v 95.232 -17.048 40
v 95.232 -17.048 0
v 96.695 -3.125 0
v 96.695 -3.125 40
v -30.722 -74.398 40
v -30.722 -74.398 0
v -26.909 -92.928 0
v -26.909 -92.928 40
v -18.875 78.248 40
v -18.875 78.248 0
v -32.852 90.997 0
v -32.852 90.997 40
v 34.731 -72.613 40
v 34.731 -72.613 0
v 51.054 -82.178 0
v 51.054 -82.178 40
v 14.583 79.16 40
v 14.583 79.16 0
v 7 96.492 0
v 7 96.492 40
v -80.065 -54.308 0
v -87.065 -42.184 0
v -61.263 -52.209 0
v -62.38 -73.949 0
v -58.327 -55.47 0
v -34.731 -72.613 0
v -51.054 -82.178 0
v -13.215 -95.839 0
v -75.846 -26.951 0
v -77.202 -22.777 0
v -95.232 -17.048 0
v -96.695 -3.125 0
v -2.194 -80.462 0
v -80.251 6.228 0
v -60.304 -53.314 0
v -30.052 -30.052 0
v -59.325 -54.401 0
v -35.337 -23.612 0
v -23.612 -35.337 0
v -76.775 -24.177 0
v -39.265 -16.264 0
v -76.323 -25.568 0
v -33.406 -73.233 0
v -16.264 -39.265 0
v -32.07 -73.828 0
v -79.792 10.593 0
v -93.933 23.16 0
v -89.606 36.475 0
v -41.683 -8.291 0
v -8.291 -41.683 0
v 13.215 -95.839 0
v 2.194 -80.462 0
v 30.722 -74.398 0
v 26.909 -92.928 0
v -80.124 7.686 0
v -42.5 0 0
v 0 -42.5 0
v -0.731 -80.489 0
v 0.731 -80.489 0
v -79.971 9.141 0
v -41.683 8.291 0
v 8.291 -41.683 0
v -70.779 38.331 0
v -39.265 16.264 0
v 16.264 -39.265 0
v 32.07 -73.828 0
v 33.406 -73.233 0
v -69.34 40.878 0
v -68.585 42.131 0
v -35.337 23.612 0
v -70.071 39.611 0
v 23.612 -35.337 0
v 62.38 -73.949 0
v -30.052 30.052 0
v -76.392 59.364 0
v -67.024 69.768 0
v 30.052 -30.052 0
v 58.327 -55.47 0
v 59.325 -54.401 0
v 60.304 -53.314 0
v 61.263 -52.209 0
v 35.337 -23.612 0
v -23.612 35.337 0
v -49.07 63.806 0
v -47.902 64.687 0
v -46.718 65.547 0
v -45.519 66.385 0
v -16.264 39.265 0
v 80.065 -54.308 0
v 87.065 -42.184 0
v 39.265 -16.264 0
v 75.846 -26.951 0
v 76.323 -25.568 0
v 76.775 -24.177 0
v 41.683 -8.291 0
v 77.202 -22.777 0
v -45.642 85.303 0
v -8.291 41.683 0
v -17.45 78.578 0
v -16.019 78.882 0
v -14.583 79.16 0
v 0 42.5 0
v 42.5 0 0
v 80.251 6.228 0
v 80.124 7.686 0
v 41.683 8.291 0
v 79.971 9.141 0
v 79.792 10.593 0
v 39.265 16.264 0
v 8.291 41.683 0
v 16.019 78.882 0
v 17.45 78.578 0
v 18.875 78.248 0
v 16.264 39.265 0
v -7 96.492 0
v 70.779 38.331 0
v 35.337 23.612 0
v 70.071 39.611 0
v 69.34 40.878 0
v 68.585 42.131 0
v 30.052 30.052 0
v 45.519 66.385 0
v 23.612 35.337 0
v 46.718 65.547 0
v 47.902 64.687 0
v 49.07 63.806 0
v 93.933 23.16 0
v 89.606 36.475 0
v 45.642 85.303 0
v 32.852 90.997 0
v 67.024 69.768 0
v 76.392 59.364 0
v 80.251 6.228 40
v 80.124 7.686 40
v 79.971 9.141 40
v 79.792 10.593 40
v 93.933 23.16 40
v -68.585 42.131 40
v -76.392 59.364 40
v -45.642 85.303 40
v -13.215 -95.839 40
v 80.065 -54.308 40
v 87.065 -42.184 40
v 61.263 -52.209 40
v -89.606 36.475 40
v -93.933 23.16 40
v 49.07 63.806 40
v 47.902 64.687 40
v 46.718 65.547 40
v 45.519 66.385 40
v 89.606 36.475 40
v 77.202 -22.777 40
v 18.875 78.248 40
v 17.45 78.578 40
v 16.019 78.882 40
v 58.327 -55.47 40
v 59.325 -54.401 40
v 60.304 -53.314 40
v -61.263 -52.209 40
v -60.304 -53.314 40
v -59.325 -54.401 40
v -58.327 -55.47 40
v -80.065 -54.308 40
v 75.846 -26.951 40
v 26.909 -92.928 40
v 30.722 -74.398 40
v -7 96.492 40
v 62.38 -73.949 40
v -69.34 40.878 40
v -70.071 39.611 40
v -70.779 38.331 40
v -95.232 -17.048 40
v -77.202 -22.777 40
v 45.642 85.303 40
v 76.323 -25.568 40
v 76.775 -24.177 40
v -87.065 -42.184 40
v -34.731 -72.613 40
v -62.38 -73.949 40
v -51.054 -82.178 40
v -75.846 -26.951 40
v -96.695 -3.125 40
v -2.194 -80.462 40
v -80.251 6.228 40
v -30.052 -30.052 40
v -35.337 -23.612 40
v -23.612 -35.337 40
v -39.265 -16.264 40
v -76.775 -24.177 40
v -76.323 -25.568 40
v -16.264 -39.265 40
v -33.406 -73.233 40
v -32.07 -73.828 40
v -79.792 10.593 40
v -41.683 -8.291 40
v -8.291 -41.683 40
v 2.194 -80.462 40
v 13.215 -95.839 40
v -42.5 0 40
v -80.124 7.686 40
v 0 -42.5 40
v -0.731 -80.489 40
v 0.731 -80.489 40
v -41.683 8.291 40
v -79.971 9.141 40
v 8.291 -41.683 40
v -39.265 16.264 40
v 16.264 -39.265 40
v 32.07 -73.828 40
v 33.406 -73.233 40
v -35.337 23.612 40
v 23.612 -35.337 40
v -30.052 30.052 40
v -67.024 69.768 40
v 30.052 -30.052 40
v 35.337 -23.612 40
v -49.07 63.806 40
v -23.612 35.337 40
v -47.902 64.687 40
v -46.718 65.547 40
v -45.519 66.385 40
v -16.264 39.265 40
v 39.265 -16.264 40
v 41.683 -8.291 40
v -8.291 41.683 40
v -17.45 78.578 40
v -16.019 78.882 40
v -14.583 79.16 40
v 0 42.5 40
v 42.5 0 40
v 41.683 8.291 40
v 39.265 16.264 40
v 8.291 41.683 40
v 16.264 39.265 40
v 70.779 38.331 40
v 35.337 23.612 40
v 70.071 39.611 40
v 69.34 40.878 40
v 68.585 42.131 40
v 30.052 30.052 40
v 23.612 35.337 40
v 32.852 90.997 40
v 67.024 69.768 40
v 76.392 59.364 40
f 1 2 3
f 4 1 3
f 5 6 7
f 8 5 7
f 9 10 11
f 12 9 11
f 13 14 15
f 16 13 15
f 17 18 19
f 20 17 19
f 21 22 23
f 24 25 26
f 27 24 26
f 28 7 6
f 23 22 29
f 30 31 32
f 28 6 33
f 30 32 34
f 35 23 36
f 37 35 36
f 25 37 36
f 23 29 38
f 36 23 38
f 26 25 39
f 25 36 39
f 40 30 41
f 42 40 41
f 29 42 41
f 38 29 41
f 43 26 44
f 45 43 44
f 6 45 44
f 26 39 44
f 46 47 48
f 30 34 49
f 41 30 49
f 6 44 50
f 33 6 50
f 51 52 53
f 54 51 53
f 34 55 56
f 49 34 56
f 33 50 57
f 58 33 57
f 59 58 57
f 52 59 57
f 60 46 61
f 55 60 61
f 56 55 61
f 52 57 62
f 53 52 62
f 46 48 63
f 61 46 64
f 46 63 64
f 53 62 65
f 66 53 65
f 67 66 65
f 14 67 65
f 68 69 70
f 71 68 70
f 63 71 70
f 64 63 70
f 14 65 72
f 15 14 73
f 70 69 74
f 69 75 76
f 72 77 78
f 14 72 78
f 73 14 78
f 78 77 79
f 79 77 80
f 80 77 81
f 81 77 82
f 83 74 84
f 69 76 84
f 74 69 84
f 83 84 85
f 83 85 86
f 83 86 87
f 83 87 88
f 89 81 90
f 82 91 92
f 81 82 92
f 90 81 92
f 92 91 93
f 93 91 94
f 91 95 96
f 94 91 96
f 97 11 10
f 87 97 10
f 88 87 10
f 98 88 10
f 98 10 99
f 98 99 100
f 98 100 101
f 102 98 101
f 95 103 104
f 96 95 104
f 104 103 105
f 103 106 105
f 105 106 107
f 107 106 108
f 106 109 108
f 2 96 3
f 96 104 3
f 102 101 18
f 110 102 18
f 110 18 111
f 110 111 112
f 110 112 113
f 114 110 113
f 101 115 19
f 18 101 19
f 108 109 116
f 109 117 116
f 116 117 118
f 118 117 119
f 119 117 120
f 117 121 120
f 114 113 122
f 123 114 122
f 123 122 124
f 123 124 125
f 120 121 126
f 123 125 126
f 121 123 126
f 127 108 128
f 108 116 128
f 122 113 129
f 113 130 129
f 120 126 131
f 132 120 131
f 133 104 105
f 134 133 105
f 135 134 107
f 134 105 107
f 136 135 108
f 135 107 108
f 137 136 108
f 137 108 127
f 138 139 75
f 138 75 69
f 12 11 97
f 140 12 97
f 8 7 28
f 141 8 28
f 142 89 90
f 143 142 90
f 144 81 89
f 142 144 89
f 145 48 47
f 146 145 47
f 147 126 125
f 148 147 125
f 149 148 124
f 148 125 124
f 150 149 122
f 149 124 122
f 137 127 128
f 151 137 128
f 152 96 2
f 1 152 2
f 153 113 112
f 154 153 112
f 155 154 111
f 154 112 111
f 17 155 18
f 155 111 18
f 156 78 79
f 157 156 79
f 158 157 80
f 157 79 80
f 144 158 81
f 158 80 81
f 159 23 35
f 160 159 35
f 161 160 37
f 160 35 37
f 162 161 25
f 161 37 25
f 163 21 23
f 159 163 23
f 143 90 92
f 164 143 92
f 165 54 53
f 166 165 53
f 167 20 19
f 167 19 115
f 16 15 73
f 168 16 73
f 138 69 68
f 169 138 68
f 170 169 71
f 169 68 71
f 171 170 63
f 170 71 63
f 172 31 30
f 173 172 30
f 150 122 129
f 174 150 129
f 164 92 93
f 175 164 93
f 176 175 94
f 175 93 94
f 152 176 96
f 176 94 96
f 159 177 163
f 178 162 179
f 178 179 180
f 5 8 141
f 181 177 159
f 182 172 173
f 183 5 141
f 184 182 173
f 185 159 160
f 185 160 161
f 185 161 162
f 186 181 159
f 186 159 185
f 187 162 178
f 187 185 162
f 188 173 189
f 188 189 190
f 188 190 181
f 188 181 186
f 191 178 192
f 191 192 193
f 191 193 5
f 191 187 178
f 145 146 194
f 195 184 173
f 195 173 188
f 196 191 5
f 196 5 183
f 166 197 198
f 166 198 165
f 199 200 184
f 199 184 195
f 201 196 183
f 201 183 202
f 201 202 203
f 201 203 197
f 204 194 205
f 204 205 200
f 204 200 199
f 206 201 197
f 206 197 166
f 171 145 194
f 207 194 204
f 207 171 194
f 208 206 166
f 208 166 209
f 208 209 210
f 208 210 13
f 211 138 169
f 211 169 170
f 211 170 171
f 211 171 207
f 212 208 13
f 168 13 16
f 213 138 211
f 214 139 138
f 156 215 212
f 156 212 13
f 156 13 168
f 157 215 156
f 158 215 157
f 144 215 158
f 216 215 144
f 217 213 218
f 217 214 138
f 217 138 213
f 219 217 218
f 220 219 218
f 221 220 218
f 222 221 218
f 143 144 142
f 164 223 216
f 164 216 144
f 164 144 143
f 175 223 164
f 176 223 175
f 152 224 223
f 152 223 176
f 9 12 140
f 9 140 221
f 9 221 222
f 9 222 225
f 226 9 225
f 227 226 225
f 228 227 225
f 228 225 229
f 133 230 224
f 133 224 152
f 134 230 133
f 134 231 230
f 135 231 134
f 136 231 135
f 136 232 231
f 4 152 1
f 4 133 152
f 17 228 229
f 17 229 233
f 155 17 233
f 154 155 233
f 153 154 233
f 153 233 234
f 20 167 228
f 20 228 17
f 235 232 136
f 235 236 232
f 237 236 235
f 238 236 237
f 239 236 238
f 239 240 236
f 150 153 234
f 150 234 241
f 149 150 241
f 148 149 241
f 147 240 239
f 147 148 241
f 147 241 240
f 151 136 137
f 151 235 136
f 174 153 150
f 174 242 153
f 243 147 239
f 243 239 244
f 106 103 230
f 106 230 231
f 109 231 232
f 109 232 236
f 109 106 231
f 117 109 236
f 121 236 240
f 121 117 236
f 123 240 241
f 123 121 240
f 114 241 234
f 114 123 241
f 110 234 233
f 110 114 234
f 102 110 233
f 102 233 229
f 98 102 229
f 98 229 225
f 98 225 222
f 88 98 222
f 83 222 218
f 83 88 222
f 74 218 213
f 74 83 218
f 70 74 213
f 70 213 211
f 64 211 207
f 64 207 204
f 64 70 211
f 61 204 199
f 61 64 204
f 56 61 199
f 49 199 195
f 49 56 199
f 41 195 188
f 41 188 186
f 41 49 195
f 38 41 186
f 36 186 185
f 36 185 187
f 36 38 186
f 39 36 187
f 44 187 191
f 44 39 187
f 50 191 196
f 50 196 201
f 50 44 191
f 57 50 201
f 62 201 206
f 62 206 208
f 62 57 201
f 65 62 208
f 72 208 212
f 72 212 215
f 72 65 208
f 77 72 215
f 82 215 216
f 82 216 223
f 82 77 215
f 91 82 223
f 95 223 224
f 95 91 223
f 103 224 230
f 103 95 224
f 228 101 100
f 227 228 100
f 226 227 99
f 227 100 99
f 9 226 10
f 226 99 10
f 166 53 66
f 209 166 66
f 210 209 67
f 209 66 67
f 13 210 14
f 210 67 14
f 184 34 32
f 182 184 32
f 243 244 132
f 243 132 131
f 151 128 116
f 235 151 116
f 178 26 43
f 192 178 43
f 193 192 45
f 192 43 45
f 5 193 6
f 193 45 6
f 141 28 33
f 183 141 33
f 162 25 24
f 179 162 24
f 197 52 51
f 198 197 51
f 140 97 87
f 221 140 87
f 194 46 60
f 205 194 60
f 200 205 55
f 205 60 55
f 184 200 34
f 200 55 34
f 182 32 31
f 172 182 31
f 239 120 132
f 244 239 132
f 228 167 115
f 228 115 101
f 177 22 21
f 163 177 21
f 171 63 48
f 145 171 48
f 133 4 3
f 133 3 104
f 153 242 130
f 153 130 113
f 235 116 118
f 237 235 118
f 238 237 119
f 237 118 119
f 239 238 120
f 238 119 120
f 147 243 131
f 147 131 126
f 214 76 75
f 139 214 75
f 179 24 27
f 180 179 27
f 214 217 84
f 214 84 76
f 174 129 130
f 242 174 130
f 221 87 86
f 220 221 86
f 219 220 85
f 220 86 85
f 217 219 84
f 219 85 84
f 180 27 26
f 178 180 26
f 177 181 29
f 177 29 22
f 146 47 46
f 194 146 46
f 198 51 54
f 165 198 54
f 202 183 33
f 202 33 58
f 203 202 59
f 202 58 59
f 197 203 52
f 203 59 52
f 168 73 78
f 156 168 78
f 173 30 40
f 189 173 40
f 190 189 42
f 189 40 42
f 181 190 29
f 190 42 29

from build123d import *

# Parameters (mm, degrees)
SKETCH1_R           = 42.5
BOSS_EXTRUDE3_DEPTH = 40


with BuildPart() as part:
    # Sketch1 → Boss-Extrude3 (new body)
    with BuildSketch(Plane.XY):
        with BuildLine():
            Line((14.58274905, 79.160170984), (7, 96.492168812))
            Line((7, 96.492168812), (-7, 96.492168812))
            Line((-7, 96.492168812), (-14.58274905, 79.160170984))
            ThreePointArc((-14.58274905, 79.160170984), (-16.735262915, 78.733221802), (-18.875338057, 78.247753024))
            Line((-18.875338057, 78.247753024), (-32.852082622, 90.997139018))
            Line((-32.852082622, 90.997139018), (-45.641719029, 85.302826015))
            Line((-45.641719029, 85.302826015), (-45.519346366, 66.385076234))
            ThreePointArc((-45.519346366, 66.385076234), (-47.312109753, 65.119532483), (-49.069707737, 63.805587708))
            Line((-49.069707737, 63.805587708), (-67.023741707, 69.767877205))
            Line((-67.023741707, 69.767877205), (-76.391570197, 59.363849648))
            Line((-76.391570197, 59.363849648), (-68.585235165, 42.131398713))
            ThreePointArc((-68.585235165, 42.131398713), (-69.708262997, 40.246084406), (-70.779479165, 38.330856621))
            Line((-70.779479165, 38.330856621), (-89.60638696, 36.475115601))
            Line((-89.60638696, 36.475115601), (-93.932624881, 23.160324373))
            Line((-93.932624881, 23.160324373), (-79.792113727, 10.592819603))
            ThreePointArc((-79.792113727, 10.592819603), (-80.05122429, 8.413722711), (-80.250835633, 6.2283722))
            Line((-80.250835633, 6.2283722), (-96.695273858, -3.124524856))
            Line((-96.695273858, -3.124524856), (-95.231875373, -17.047831391))
            Line((-95.231875373, -17.047831391), (-77.202210937, -22.77735425))
            ThreePointArc((-77.202210937, -22.77735425), (-76.55260166, -24.873448077), (-75.846093565, -26.951054358))
            Line((-75.846093565, -26.951054358), (-87.064669458, -42.18390658))
            Line((-87.064669458, -42.18390658), (-80.064669458, -54.308262233))
            Line((-80.064669458, -54.308262233), (-61.263344515, -52.209116626))
            ThreePointArc((-61.263344515, -52.209116626), (-59.817338744, -53.859773725), (-58.32687288, -55.470398775))
            Line((-58.32687288, -55.470398775), (-62.37979275, -73.949307627))
            Line((-62.37979275, -73.949307627), (-51.053554829, -82.178301159))
            Line((-51.053554829, -82.178301159), (-34.731489268, -72.613448433))
            ThreePointArc((-34.731489268, -72.613448433), (-32.739114537, -73.533255194), (-30.72240599, -74.39840731))
            Line((-30.72240599, -74.39840731), (-26.908883174, -92.928201578))
            Line((-26.908883174, -92.928201578), (-13.214816763, -95.838965249))
            Line((-13.214816763, -95.838965249), (-2.194244, -80.462255334))
            ThreePointArc((-2.194244, -80.462255334), (0, -80.492168812), (2.194244, -80.462255334))
            Line((2.194244, -80.462255334), (13.214816763, -95.838965249))
            Line((13.214816763, -95.838965249), (26.908883174, -92.928201578))
            Line((26.908883174, -92.928201578), (30.72240599, -74.39840731))
            ThreePointArc((30.72240599, -74.39840731), (32.739114537, -73.533255194), (34.731489268, -72.613448433))
            Line((34.731489268, -72.613448433), (51.053554829, -82.178301159))
            Line((51.053554829, -82.178301159), (62.37979275, -73.949307627))
            Line((62.37979275, -73.949307627), (58.32687288, -55.470398775))
            ThreePointArc((58.32687288, -55.470398775), (59.817338744, -53.859773725), (61.263344515, -52.209116626))
            Line((61.263344515, -52.209116626), (80.064669458, -54.308262233))
            Line((80.064669458, -54.308262233), (87.064669458, -42.18390658))
            Line((87.064669458, -42.18390658), (75.846093565, -26.951054358))
            ThreePointArc((75.846093565, -26.951054358), (76.55260166, -24.873448077), (77.202210937, -22.77735425))
            Line((77.202210937, -22.77735425), (95.231875373, -17.047831391))
            Line((95.231875373, -17.047831391), (96.695273858, -3.124524856))
            Line((96.695273858, -3.124524856), (80.250835633, 6.2283722))
            ThreePointArc((80.250835633, 6.2283722), (80.05122429, 8.413722711), (79.792113727, 10.592819603))
            Line((79.792113727, 10.592819603), (93.932624881, 23.160324373))
            Line((93.932624881, 23.160324373), (89.60638696, 36.475115601))
            Line((89.60638696, 36.475115601), (70.779479165, 38.330856621))
            ThreePointArc((70.779479165, 38.330856621), (69.708262997, 40.246084406), (68.585235165, 42.131398713))
            Line((68.585235165, 42.131398713), (76.391570197, 59.363849648))
            Line((76.391570197, 59.363849648), (67.023741707, 69.767877205))
            Line((67.023741707, 69.767877205), (49.069707737, 63.805587708))
            ThreePointArc((49.069707737, 63.805587708), (47.312109753, 65.119532483), (45.519346366, 66.385076234))
            Line((45.519346366, 66.385076234), (45.641719029, 85.302826015))
            Line((45.641719029, 85.302826015), (32.852082622, 90.997139018))
            Line((32.852082622, 90.997139018), (18.875338057, 78.247753024))
            ThreePointArc((18.875338057, 78.247753024), (16.735262915, 78.733221802), (14.58274905, 79.160170984))
        make_face()
        Circle(SKETCH1_R, mode=Mode.SUBTRACT)
    extrude(amount=BOSS_EXTRUDE3_DEPTH)


solid = part.part
